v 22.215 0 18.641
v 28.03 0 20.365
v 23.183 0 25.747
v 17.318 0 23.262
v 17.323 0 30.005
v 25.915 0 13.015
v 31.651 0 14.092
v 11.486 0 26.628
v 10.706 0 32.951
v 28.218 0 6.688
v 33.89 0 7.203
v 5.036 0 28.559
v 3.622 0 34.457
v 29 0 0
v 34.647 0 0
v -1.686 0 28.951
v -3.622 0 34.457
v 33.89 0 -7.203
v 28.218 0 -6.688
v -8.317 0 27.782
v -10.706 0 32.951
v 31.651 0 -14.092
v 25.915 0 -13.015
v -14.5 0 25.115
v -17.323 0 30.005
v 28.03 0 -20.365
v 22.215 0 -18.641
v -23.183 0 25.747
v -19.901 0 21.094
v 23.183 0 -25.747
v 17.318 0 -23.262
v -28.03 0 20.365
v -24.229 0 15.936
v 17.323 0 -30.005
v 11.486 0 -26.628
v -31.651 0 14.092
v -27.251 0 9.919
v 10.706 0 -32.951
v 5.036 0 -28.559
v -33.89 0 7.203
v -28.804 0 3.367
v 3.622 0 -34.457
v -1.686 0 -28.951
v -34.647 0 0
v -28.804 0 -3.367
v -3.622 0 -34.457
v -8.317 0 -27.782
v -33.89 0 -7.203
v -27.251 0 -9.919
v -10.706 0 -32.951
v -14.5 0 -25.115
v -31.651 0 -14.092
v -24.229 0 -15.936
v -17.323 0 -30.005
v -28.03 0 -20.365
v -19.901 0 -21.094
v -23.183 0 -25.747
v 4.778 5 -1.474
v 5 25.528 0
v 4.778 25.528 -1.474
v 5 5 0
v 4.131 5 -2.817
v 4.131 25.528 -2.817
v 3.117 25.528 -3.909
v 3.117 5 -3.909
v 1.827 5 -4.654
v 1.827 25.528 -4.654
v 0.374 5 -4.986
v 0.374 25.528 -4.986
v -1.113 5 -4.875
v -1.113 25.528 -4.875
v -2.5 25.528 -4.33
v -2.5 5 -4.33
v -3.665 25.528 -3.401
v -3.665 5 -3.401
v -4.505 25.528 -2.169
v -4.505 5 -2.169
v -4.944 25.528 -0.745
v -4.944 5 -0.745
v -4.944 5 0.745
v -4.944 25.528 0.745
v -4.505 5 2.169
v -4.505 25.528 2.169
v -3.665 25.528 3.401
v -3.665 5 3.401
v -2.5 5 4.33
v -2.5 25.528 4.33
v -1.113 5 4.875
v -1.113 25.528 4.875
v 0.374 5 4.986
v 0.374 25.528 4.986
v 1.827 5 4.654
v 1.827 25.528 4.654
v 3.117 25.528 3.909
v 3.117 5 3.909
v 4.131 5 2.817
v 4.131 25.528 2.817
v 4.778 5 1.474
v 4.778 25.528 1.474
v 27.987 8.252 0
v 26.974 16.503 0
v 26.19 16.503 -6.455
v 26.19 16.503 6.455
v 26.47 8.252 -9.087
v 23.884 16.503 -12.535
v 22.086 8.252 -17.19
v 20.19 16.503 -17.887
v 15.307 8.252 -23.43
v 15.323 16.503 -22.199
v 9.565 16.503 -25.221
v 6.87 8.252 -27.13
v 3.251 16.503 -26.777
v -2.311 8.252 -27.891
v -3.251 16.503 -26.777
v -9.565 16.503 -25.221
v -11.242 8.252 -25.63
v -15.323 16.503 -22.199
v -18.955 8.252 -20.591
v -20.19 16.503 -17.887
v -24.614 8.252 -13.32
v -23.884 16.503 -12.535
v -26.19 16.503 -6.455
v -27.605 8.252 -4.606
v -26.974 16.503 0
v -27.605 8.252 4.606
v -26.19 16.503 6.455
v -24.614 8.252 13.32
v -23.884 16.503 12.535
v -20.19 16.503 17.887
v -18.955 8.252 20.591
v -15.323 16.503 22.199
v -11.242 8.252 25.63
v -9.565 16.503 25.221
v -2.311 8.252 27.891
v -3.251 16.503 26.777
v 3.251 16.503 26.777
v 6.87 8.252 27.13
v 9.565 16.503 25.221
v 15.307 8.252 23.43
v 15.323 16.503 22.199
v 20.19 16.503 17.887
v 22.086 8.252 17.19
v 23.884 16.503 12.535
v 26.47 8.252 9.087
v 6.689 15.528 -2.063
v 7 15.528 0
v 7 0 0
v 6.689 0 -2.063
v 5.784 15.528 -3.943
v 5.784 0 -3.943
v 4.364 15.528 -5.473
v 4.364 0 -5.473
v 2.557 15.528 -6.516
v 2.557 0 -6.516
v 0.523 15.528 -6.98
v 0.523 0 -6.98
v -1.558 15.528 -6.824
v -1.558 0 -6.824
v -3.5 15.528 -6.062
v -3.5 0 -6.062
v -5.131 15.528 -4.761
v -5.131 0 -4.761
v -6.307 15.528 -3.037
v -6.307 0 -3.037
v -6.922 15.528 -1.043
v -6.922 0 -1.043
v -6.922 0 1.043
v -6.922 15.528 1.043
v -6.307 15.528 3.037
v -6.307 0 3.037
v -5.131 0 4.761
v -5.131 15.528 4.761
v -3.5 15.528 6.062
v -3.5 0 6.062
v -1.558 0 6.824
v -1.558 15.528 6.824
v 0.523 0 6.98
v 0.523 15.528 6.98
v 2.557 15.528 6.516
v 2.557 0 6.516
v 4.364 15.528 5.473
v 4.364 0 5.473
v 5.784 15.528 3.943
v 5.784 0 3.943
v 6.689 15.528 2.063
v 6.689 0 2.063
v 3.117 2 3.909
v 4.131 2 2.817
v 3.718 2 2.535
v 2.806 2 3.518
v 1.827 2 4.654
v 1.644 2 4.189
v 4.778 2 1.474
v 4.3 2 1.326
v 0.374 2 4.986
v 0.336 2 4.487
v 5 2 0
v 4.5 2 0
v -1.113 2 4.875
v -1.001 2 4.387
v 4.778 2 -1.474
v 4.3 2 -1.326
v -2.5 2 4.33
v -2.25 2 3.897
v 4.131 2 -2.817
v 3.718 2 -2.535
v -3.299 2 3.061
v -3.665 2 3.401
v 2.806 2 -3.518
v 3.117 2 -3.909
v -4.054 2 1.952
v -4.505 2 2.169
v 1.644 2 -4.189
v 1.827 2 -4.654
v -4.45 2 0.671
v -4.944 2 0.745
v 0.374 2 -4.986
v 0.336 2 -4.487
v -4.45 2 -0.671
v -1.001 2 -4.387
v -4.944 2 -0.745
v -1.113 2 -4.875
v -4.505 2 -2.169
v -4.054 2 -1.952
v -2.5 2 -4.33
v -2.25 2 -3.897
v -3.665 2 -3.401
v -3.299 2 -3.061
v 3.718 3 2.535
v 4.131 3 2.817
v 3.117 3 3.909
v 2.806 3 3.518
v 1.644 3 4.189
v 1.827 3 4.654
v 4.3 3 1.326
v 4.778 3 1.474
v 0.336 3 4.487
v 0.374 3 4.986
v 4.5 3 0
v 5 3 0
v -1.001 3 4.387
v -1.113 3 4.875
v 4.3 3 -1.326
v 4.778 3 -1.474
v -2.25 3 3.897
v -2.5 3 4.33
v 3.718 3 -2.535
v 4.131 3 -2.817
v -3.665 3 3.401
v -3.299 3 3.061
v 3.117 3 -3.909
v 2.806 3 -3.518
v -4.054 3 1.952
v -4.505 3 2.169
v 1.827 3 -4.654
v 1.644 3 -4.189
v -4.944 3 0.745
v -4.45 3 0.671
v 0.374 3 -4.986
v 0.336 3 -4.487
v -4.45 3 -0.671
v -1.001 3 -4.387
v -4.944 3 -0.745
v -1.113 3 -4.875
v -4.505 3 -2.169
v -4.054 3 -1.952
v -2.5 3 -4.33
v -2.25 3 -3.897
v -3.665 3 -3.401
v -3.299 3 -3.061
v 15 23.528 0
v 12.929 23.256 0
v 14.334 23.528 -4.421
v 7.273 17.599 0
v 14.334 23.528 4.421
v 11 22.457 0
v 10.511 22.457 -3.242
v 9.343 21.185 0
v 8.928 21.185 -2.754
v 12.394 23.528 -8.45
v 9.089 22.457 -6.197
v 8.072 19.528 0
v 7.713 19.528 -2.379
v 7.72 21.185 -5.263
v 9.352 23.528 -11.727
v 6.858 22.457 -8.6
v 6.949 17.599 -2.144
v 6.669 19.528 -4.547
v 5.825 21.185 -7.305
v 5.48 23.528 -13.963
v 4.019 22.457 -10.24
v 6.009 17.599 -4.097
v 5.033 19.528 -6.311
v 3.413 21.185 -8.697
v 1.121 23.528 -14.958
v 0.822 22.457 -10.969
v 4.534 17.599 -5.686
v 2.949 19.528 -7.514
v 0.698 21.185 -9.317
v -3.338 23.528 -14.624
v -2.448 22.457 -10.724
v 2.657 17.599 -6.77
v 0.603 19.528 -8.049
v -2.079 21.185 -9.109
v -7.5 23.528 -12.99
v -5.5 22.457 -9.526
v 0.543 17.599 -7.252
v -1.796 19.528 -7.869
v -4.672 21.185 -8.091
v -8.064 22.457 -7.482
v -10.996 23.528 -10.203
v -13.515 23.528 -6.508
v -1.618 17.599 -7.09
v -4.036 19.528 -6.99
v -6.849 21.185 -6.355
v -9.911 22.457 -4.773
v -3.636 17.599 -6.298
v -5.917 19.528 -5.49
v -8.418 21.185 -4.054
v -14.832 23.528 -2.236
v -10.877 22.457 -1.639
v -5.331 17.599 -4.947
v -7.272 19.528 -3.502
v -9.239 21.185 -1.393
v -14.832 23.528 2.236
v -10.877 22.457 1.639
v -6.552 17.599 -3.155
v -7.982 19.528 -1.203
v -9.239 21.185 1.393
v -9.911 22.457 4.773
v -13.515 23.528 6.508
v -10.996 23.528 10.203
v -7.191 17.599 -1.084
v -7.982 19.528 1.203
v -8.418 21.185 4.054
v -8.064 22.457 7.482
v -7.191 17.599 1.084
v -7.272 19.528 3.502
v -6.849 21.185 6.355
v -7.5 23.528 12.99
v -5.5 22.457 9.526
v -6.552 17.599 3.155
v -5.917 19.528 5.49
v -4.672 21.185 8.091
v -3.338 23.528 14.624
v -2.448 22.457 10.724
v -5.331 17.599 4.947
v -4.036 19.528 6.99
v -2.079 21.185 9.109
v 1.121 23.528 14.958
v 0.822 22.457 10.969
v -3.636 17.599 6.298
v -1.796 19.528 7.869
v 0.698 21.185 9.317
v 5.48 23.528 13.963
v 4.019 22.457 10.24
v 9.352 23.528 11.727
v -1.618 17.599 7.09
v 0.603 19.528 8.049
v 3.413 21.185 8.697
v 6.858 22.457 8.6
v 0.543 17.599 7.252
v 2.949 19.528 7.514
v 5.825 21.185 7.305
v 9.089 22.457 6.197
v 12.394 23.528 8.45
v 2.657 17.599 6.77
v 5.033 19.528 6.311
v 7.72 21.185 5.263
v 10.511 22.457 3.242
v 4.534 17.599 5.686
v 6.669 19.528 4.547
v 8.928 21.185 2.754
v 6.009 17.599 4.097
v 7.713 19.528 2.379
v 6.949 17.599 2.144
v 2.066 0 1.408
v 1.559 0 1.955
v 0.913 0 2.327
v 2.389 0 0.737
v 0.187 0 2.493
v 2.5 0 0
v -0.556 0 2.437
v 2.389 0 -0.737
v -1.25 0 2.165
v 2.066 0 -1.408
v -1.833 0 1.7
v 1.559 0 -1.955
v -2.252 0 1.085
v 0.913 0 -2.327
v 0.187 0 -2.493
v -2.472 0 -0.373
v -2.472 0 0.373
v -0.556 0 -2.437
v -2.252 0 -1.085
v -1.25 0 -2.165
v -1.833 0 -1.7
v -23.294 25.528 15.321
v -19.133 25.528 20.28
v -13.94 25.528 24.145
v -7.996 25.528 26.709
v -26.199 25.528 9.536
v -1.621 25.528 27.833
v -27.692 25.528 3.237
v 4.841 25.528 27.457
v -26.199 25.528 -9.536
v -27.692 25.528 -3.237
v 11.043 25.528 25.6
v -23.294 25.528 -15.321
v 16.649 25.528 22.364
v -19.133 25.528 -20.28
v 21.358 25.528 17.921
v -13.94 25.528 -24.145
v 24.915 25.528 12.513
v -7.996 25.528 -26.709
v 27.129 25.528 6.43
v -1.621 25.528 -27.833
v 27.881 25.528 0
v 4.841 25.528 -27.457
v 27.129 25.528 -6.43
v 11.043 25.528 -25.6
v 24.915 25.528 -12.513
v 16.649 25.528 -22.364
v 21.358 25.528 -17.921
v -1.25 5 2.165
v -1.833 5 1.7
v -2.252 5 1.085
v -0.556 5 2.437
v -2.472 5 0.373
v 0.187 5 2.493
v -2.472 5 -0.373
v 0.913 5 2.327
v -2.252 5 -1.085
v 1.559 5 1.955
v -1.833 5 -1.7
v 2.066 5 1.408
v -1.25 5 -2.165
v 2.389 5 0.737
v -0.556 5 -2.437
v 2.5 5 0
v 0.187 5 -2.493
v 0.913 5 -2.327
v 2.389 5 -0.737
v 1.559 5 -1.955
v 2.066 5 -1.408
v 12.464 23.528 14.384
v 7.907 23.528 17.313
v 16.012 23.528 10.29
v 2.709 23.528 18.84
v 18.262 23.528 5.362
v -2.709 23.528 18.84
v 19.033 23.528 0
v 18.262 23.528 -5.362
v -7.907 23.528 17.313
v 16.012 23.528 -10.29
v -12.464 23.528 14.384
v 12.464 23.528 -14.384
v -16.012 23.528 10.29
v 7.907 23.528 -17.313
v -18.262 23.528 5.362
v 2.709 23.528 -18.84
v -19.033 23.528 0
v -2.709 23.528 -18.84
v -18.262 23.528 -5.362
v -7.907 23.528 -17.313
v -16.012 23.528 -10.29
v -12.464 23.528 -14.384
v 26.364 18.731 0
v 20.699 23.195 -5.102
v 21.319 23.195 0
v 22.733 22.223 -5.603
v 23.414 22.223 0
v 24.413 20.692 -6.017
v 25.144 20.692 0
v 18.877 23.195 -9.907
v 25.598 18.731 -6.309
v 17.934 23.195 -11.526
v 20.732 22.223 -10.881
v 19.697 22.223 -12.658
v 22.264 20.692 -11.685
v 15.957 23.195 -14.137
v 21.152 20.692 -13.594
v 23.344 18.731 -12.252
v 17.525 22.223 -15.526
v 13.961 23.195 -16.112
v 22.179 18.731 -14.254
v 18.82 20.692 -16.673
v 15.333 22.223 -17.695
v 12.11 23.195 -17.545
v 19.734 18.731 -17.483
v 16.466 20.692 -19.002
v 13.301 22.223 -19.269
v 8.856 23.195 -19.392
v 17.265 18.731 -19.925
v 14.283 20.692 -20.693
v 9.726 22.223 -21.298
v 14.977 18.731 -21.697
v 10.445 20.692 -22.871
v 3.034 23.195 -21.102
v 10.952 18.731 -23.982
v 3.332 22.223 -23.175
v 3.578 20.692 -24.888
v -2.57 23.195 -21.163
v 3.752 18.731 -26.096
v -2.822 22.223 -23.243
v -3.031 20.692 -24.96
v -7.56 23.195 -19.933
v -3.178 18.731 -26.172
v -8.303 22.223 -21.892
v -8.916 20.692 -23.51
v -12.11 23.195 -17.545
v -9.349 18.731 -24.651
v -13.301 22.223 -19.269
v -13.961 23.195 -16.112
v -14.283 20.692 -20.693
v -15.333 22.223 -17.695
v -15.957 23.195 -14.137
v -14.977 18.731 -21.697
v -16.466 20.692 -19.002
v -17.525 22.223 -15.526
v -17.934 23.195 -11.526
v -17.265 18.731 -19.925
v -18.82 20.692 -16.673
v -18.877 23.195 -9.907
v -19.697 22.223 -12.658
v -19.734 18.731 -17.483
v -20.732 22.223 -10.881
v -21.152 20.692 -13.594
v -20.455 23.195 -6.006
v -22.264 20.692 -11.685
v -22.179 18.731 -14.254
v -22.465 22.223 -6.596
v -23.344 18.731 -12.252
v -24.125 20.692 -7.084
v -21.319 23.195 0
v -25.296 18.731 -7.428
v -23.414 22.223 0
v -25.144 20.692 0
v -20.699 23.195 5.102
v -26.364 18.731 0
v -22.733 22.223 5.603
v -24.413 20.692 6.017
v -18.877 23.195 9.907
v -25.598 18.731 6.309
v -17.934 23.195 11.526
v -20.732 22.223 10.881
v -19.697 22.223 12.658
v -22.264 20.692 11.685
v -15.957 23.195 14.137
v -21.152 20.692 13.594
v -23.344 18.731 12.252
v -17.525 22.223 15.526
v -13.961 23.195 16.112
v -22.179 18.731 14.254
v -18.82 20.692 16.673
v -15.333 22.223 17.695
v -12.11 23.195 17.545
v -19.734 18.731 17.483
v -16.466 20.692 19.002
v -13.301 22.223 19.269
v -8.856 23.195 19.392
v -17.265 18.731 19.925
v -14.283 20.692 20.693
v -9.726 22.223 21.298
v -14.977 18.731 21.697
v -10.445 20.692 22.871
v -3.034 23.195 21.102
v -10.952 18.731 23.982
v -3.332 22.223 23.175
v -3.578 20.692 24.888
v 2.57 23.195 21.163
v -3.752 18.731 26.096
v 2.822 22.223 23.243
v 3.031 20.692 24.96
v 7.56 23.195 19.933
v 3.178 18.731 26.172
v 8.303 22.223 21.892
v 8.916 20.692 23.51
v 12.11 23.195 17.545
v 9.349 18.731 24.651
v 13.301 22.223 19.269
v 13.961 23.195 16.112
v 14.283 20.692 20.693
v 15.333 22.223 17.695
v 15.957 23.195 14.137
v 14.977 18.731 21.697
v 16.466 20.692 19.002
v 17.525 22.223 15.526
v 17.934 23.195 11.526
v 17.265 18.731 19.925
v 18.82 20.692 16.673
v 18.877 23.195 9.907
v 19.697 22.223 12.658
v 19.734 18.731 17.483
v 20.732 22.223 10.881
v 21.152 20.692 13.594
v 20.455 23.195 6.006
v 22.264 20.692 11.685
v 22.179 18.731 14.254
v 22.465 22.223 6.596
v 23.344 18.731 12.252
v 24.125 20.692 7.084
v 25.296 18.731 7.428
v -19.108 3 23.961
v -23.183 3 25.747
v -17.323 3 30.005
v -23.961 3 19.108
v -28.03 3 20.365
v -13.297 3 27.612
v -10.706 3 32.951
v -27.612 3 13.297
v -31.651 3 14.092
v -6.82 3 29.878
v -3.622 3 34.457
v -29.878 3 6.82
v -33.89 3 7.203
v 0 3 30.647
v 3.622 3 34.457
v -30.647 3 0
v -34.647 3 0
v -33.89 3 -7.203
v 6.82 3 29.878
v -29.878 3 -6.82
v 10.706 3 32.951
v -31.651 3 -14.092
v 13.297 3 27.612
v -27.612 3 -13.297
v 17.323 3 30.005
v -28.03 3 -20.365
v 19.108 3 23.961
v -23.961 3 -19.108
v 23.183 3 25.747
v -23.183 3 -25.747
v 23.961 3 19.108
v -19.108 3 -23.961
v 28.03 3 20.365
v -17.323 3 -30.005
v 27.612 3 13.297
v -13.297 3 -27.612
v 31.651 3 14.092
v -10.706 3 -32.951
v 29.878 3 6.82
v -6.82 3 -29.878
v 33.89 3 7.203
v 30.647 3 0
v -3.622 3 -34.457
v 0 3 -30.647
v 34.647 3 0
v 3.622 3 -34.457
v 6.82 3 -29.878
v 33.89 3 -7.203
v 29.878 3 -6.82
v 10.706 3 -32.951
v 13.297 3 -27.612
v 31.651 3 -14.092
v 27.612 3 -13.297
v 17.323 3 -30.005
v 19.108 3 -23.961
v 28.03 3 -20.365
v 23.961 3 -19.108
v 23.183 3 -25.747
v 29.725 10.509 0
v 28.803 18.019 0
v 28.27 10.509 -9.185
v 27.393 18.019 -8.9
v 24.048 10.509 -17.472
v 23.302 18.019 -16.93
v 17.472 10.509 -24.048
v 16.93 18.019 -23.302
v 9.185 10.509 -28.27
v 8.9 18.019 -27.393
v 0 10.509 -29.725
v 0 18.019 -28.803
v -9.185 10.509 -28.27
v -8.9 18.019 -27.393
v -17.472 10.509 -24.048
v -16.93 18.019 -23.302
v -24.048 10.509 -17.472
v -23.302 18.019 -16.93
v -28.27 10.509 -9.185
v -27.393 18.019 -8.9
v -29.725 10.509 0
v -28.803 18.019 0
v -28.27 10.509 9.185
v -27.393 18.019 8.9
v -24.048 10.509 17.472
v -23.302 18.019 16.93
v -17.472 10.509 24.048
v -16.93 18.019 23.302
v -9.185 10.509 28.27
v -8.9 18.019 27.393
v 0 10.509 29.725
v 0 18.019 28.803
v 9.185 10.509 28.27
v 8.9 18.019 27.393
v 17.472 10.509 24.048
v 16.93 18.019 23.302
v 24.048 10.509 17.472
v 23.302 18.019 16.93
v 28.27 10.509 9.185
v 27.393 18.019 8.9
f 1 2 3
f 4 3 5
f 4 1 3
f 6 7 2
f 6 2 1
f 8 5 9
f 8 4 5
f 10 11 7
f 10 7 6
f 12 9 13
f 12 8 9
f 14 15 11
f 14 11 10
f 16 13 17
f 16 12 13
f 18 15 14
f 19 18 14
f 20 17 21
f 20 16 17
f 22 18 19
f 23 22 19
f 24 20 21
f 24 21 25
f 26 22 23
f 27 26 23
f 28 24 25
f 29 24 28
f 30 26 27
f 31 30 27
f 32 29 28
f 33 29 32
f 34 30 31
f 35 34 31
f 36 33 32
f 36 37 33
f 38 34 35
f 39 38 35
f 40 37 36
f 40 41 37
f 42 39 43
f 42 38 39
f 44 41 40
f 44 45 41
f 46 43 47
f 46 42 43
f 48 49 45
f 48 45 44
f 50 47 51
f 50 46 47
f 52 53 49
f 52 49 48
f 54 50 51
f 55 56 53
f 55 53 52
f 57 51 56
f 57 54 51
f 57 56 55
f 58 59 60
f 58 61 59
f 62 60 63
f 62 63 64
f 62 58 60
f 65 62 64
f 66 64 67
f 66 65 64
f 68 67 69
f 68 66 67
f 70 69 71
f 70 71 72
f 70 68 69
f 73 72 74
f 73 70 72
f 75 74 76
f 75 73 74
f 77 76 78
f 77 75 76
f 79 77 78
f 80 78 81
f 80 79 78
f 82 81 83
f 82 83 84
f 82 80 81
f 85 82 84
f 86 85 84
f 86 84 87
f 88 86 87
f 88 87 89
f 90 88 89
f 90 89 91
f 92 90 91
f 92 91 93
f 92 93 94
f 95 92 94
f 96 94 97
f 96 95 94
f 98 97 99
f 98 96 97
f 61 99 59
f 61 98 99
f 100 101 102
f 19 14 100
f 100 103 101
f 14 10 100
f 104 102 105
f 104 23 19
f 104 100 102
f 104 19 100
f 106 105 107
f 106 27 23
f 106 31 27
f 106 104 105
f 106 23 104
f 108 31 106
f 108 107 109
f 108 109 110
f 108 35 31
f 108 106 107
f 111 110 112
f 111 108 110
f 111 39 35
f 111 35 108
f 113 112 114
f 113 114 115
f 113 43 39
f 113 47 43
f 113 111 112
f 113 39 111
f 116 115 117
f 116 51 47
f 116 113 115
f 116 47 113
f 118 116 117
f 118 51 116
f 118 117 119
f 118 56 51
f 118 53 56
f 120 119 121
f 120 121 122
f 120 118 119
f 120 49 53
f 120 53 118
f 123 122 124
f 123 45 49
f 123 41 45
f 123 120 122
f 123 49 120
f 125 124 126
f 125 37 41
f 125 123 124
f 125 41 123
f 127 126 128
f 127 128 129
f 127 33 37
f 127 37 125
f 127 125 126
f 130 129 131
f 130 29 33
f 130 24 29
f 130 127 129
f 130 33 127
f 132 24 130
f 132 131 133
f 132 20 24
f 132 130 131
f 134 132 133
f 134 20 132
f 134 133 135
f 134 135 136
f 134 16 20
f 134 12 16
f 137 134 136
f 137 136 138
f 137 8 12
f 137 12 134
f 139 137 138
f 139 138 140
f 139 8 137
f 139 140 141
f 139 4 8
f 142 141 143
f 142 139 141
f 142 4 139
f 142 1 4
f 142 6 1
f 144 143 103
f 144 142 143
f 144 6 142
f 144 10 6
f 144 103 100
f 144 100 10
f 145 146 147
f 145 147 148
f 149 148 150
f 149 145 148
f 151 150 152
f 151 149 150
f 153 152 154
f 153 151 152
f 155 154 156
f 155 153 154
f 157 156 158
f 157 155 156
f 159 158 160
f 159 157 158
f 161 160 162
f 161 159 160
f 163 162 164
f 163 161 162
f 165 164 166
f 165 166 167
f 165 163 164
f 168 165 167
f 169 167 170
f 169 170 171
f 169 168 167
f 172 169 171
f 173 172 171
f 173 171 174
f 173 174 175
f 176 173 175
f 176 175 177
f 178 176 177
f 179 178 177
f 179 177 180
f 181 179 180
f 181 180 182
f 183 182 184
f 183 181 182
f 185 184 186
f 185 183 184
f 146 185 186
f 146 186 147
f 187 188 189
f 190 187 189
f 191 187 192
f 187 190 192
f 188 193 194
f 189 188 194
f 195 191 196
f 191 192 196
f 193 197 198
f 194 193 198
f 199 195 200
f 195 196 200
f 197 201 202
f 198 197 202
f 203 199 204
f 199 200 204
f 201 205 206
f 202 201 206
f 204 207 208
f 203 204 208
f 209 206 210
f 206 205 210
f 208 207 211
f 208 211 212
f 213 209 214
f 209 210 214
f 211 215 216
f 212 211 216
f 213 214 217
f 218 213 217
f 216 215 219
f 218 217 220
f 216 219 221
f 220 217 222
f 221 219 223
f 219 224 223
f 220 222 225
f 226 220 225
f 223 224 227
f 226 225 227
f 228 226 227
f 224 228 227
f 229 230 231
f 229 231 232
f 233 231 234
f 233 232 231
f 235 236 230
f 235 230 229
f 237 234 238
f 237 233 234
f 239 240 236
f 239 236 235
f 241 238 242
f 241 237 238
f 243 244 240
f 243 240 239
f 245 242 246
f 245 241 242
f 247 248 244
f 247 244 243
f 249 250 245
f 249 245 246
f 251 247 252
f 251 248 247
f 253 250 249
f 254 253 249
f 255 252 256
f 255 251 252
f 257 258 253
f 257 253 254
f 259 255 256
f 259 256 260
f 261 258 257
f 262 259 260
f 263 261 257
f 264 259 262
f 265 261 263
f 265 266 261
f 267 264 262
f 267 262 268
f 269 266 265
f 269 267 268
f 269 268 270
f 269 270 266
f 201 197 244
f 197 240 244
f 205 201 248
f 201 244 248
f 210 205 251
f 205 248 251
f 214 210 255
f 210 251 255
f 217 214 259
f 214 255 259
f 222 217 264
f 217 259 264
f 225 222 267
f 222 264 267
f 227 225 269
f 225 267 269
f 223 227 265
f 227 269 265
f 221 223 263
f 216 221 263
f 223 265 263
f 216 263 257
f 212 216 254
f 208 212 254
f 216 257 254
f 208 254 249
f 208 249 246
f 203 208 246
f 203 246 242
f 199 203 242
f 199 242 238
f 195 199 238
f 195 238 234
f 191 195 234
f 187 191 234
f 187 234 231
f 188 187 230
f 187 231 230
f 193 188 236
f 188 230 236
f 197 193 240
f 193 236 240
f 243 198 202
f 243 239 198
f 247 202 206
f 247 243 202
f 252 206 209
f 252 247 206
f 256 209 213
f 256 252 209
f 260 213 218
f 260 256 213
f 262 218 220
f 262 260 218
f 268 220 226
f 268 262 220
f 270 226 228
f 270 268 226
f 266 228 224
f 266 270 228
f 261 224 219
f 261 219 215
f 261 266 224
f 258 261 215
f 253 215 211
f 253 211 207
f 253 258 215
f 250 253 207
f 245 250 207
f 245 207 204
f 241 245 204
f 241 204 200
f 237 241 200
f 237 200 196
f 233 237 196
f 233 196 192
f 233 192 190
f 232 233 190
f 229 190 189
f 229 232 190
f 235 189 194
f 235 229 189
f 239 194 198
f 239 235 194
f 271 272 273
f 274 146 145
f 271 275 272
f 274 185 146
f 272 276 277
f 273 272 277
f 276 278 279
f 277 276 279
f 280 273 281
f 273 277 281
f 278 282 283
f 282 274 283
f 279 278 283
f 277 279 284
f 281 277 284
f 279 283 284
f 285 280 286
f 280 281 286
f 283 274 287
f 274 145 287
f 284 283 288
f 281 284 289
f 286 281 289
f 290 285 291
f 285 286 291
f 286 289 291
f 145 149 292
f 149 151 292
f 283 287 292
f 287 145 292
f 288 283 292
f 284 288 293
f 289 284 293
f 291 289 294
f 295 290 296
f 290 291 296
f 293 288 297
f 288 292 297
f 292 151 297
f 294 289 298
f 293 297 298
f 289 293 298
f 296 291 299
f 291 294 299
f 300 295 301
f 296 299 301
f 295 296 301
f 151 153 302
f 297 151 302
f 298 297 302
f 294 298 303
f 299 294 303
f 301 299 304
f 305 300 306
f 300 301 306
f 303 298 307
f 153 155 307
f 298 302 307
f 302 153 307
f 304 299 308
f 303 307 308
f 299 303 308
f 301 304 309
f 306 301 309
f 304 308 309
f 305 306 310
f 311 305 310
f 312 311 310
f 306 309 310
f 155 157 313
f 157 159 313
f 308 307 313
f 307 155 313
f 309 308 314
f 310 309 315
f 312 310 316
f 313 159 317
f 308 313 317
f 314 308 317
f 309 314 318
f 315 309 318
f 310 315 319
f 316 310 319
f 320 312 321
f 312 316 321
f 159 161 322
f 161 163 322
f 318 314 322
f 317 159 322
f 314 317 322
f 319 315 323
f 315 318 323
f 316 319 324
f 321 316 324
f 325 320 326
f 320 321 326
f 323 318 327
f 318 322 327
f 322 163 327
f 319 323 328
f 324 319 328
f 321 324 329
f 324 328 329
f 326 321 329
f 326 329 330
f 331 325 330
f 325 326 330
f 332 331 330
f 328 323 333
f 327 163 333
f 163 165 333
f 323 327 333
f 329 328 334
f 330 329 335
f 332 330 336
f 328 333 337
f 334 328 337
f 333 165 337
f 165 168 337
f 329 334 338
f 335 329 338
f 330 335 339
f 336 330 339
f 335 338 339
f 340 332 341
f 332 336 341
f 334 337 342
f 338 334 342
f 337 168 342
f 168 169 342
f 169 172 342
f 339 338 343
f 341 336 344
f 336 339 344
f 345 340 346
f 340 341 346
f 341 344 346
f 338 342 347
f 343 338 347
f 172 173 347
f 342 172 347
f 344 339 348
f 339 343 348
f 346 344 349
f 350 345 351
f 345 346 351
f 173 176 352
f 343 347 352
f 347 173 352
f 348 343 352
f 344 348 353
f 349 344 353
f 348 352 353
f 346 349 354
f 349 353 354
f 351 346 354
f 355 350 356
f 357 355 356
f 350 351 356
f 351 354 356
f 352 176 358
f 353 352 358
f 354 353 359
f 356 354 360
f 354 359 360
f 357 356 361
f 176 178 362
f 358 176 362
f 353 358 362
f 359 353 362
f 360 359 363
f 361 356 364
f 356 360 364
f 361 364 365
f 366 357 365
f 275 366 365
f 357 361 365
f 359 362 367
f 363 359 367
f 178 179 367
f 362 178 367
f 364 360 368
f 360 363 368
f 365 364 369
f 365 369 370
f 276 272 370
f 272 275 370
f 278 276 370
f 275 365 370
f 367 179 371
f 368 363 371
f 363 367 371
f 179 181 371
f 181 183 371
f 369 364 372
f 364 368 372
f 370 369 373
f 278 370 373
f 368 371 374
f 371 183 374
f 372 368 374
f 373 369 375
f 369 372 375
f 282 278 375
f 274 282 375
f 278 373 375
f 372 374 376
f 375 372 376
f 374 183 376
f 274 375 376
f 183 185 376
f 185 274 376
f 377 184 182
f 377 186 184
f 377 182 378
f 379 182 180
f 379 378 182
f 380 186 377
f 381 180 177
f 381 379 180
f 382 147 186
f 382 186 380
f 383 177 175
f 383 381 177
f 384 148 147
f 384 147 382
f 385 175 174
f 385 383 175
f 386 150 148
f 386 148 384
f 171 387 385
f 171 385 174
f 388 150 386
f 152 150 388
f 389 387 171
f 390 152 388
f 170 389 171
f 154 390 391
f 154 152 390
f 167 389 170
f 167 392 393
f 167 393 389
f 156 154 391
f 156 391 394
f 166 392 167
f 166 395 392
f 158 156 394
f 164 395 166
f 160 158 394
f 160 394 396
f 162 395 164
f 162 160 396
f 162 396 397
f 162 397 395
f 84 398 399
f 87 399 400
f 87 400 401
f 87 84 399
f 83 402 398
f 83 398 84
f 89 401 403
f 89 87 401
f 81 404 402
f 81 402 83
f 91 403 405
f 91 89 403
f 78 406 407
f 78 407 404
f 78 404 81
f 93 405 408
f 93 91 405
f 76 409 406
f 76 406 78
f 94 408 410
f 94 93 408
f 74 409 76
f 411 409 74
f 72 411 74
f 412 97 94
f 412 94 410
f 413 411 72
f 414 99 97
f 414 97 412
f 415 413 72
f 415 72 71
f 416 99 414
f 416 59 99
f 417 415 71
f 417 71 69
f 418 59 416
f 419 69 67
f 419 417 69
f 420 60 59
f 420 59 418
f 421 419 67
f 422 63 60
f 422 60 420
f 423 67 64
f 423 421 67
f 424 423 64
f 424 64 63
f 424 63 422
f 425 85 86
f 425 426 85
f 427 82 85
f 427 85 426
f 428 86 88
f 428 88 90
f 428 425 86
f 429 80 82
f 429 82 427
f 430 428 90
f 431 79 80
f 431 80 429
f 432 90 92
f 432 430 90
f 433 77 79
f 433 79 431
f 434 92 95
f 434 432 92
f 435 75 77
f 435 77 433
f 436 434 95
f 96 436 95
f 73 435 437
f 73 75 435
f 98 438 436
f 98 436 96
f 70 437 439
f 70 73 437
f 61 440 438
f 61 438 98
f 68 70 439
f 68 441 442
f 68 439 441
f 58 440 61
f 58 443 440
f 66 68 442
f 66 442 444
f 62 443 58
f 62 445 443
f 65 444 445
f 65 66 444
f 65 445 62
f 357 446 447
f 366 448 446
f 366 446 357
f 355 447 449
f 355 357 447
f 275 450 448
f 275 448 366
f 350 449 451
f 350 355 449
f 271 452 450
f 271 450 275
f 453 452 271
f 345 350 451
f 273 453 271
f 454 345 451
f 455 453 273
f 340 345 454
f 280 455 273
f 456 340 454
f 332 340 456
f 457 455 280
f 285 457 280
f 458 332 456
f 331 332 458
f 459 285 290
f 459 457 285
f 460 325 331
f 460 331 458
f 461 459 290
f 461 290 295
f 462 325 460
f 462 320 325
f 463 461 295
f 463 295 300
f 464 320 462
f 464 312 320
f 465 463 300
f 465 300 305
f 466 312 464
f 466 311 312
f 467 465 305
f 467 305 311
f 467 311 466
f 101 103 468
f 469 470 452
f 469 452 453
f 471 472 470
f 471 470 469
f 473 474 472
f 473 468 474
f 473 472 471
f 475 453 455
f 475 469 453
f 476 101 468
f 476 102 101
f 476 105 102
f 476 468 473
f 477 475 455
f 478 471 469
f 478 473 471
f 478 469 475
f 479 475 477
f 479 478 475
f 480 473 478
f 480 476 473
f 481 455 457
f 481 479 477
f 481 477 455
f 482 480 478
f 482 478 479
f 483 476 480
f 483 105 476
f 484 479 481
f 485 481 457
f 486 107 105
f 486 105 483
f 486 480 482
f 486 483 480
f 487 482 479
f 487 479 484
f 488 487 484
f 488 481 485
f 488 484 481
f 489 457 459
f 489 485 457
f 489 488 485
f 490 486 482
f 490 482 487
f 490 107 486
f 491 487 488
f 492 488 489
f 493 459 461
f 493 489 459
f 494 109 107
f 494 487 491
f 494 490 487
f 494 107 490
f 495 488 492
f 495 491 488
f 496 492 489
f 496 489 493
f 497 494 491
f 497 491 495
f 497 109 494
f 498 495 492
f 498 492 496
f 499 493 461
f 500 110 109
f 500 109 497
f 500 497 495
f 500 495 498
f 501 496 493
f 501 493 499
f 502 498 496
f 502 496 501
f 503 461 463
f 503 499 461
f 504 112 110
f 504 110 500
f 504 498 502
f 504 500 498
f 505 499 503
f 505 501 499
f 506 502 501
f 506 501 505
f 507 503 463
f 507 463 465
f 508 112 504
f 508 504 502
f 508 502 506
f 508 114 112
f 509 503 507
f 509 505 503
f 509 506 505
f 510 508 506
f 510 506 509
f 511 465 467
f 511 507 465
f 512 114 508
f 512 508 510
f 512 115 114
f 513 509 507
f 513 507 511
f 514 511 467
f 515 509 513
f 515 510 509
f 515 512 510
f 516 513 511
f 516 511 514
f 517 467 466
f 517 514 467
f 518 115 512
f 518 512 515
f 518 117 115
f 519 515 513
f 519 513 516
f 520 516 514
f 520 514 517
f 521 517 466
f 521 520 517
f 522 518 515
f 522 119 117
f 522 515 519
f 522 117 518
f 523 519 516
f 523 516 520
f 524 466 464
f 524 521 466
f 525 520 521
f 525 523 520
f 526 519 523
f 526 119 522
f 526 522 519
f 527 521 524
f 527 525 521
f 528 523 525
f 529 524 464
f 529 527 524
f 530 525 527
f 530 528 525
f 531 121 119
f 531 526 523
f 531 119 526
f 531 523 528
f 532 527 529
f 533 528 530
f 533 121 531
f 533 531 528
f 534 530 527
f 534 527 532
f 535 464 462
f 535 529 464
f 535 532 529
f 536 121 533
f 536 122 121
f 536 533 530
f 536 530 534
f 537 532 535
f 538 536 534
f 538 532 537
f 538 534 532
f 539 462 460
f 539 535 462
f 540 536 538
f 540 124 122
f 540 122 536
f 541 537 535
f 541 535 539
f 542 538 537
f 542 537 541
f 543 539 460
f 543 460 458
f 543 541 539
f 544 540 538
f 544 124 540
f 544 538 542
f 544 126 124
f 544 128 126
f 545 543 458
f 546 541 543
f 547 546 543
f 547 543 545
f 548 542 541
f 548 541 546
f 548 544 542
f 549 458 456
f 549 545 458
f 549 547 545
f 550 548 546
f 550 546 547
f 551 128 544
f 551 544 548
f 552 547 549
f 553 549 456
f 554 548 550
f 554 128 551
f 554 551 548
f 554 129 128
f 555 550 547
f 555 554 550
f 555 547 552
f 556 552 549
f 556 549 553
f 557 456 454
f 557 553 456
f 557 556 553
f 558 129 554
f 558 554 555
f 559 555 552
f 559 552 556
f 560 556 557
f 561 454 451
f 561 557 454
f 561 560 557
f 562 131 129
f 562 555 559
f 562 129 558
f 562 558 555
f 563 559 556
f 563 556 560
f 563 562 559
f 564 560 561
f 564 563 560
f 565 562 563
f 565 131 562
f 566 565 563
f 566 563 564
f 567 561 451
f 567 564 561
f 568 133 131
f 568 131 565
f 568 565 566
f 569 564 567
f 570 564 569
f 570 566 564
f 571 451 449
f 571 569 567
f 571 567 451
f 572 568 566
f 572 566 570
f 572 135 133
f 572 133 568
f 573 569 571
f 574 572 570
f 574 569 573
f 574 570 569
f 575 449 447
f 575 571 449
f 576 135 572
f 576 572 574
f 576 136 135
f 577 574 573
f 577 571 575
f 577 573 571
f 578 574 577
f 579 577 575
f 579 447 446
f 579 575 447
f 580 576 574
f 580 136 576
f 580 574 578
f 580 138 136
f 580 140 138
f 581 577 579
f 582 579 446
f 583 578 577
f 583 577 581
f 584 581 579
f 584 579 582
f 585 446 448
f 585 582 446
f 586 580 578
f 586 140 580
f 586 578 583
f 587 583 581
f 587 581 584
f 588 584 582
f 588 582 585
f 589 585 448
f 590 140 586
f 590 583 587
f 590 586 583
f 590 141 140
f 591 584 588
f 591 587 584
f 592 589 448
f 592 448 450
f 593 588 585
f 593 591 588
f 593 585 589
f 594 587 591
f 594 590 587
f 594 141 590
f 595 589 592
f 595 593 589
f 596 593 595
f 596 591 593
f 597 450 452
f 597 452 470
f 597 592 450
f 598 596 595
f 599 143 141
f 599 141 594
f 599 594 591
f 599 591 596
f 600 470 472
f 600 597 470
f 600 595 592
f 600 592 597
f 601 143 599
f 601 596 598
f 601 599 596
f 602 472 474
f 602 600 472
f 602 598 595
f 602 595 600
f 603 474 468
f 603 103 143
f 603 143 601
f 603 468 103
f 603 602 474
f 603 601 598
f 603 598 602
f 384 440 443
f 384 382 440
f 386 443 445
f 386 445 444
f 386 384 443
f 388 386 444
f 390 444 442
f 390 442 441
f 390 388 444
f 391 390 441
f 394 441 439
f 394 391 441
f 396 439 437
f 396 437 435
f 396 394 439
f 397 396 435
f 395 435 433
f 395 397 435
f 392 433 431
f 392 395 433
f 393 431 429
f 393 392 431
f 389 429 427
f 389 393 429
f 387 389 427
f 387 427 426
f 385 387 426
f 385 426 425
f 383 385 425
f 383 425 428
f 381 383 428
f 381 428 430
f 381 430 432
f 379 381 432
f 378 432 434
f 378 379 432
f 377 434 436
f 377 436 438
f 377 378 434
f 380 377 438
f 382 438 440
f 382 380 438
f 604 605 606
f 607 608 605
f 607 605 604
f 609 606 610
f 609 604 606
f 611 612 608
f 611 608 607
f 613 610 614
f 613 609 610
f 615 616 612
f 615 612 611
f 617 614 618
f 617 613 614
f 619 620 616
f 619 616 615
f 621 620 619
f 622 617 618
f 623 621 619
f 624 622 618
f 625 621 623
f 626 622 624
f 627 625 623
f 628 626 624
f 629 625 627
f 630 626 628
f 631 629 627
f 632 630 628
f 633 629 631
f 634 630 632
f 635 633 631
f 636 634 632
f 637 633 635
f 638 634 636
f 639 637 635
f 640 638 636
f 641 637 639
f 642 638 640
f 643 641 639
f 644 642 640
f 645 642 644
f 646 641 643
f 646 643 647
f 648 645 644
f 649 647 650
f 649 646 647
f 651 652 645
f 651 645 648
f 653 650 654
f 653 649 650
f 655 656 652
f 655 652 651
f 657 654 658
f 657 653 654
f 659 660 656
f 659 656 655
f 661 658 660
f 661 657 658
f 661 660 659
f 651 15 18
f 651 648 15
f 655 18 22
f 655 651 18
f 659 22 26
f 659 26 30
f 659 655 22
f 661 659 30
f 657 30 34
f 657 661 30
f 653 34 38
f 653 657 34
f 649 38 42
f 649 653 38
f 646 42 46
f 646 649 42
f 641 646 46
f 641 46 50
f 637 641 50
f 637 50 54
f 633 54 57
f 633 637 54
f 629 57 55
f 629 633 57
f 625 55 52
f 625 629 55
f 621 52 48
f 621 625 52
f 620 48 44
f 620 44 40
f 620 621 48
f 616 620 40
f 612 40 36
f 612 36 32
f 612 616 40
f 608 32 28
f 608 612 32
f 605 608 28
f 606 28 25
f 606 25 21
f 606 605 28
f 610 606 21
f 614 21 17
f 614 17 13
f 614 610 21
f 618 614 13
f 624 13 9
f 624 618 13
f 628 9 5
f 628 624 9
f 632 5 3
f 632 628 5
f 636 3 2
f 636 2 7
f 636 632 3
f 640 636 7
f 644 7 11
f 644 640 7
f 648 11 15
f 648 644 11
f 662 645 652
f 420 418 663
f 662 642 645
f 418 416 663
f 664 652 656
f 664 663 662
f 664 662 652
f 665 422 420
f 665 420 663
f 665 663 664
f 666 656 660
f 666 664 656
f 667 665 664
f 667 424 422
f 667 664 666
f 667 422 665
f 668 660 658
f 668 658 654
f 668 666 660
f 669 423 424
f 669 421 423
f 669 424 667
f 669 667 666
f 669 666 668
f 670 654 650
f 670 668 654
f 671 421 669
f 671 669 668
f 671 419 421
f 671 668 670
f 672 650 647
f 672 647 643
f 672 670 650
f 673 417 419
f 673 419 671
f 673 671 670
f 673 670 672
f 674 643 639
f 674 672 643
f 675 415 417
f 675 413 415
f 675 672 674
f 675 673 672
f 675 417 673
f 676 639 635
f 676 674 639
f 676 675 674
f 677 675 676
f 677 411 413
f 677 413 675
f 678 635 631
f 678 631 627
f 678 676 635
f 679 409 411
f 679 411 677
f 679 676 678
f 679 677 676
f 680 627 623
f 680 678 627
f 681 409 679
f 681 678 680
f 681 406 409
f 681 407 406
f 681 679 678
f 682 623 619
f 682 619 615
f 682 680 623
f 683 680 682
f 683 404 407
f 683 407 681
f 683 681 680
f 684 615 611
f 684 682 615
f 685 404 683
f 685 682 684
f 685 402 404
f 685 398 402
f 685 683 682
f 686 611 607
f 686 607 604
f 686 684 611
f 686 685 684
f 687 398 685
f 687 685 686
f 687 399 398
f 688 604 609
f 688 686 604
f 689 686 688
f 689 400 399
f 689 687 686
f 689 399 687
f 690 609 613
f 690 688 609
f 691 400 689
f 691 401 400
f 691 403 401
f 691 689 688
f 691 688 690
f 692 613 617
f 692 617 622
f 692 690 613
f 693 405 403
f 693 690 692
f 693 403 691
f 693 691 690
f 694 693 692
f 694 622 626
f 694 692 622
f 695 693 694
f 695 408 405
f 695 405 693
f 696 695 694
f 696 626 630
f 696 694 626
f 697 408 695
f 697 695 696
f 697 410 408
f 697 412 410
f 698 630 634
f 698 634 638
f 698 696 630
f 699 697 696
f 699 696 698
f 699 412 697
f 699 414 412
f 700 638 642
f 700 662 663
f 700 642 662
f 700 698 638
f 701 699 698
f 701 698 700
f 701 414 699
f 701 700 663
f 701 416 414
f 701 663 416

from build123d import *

# Parameters (mm, degrees)
R_VOL_MINCE1_OUTLINE_W = 0.5
R_VOL_MINCE1_OUTLINE_H = 1
CONG_2_R               = 8
CONG_3_R               = 8


# Read off the part's stored shape, not the designer's step: Révol.-Mince1
with BuildPart() as part:
    # Révol.-Mince1 outline → Révol.-Mince1 (revolve)
    with BuildSketch(Plane.XY):
        Polygon((2.5, 5), (2.5, 0), (7, 0), (7, 23.528490035), (26.111064682, 23.528490035), (29, 0), (34.646665968, 0), (34.646665968, 3), (30.646665968, 3), (27.880515211, 25.528490035), (5, 25.528490035), (5, 5), align=None)
        with Locations((4.75, 2.5)):
            Rectangle(R_VOL_MINCE1_OUTLINE_W, R_VOL_MINCE1_OUTLINE_H, mode=Mode.SUBTRACT)
    revolve(axis=Axis((0, 0, 0), (0, 1, 0)))

    # Congé2
    cong_2_edges = [part.edges().sort_by_distance(p)[0] for p in [
        (-26.111064682, 23.528490035, 0),
    ]]
    fillet(cong_2_edges, radius=CONG_2_R)

    # Congé3
    cong_3_edges = [part.edges().sort_by_distance(p)[0] for p in [
        (-7, 23.528490035, 0),
    ]]
    fillet(cong_3_edges, radius=CONG_3_R)


solid = part.part
